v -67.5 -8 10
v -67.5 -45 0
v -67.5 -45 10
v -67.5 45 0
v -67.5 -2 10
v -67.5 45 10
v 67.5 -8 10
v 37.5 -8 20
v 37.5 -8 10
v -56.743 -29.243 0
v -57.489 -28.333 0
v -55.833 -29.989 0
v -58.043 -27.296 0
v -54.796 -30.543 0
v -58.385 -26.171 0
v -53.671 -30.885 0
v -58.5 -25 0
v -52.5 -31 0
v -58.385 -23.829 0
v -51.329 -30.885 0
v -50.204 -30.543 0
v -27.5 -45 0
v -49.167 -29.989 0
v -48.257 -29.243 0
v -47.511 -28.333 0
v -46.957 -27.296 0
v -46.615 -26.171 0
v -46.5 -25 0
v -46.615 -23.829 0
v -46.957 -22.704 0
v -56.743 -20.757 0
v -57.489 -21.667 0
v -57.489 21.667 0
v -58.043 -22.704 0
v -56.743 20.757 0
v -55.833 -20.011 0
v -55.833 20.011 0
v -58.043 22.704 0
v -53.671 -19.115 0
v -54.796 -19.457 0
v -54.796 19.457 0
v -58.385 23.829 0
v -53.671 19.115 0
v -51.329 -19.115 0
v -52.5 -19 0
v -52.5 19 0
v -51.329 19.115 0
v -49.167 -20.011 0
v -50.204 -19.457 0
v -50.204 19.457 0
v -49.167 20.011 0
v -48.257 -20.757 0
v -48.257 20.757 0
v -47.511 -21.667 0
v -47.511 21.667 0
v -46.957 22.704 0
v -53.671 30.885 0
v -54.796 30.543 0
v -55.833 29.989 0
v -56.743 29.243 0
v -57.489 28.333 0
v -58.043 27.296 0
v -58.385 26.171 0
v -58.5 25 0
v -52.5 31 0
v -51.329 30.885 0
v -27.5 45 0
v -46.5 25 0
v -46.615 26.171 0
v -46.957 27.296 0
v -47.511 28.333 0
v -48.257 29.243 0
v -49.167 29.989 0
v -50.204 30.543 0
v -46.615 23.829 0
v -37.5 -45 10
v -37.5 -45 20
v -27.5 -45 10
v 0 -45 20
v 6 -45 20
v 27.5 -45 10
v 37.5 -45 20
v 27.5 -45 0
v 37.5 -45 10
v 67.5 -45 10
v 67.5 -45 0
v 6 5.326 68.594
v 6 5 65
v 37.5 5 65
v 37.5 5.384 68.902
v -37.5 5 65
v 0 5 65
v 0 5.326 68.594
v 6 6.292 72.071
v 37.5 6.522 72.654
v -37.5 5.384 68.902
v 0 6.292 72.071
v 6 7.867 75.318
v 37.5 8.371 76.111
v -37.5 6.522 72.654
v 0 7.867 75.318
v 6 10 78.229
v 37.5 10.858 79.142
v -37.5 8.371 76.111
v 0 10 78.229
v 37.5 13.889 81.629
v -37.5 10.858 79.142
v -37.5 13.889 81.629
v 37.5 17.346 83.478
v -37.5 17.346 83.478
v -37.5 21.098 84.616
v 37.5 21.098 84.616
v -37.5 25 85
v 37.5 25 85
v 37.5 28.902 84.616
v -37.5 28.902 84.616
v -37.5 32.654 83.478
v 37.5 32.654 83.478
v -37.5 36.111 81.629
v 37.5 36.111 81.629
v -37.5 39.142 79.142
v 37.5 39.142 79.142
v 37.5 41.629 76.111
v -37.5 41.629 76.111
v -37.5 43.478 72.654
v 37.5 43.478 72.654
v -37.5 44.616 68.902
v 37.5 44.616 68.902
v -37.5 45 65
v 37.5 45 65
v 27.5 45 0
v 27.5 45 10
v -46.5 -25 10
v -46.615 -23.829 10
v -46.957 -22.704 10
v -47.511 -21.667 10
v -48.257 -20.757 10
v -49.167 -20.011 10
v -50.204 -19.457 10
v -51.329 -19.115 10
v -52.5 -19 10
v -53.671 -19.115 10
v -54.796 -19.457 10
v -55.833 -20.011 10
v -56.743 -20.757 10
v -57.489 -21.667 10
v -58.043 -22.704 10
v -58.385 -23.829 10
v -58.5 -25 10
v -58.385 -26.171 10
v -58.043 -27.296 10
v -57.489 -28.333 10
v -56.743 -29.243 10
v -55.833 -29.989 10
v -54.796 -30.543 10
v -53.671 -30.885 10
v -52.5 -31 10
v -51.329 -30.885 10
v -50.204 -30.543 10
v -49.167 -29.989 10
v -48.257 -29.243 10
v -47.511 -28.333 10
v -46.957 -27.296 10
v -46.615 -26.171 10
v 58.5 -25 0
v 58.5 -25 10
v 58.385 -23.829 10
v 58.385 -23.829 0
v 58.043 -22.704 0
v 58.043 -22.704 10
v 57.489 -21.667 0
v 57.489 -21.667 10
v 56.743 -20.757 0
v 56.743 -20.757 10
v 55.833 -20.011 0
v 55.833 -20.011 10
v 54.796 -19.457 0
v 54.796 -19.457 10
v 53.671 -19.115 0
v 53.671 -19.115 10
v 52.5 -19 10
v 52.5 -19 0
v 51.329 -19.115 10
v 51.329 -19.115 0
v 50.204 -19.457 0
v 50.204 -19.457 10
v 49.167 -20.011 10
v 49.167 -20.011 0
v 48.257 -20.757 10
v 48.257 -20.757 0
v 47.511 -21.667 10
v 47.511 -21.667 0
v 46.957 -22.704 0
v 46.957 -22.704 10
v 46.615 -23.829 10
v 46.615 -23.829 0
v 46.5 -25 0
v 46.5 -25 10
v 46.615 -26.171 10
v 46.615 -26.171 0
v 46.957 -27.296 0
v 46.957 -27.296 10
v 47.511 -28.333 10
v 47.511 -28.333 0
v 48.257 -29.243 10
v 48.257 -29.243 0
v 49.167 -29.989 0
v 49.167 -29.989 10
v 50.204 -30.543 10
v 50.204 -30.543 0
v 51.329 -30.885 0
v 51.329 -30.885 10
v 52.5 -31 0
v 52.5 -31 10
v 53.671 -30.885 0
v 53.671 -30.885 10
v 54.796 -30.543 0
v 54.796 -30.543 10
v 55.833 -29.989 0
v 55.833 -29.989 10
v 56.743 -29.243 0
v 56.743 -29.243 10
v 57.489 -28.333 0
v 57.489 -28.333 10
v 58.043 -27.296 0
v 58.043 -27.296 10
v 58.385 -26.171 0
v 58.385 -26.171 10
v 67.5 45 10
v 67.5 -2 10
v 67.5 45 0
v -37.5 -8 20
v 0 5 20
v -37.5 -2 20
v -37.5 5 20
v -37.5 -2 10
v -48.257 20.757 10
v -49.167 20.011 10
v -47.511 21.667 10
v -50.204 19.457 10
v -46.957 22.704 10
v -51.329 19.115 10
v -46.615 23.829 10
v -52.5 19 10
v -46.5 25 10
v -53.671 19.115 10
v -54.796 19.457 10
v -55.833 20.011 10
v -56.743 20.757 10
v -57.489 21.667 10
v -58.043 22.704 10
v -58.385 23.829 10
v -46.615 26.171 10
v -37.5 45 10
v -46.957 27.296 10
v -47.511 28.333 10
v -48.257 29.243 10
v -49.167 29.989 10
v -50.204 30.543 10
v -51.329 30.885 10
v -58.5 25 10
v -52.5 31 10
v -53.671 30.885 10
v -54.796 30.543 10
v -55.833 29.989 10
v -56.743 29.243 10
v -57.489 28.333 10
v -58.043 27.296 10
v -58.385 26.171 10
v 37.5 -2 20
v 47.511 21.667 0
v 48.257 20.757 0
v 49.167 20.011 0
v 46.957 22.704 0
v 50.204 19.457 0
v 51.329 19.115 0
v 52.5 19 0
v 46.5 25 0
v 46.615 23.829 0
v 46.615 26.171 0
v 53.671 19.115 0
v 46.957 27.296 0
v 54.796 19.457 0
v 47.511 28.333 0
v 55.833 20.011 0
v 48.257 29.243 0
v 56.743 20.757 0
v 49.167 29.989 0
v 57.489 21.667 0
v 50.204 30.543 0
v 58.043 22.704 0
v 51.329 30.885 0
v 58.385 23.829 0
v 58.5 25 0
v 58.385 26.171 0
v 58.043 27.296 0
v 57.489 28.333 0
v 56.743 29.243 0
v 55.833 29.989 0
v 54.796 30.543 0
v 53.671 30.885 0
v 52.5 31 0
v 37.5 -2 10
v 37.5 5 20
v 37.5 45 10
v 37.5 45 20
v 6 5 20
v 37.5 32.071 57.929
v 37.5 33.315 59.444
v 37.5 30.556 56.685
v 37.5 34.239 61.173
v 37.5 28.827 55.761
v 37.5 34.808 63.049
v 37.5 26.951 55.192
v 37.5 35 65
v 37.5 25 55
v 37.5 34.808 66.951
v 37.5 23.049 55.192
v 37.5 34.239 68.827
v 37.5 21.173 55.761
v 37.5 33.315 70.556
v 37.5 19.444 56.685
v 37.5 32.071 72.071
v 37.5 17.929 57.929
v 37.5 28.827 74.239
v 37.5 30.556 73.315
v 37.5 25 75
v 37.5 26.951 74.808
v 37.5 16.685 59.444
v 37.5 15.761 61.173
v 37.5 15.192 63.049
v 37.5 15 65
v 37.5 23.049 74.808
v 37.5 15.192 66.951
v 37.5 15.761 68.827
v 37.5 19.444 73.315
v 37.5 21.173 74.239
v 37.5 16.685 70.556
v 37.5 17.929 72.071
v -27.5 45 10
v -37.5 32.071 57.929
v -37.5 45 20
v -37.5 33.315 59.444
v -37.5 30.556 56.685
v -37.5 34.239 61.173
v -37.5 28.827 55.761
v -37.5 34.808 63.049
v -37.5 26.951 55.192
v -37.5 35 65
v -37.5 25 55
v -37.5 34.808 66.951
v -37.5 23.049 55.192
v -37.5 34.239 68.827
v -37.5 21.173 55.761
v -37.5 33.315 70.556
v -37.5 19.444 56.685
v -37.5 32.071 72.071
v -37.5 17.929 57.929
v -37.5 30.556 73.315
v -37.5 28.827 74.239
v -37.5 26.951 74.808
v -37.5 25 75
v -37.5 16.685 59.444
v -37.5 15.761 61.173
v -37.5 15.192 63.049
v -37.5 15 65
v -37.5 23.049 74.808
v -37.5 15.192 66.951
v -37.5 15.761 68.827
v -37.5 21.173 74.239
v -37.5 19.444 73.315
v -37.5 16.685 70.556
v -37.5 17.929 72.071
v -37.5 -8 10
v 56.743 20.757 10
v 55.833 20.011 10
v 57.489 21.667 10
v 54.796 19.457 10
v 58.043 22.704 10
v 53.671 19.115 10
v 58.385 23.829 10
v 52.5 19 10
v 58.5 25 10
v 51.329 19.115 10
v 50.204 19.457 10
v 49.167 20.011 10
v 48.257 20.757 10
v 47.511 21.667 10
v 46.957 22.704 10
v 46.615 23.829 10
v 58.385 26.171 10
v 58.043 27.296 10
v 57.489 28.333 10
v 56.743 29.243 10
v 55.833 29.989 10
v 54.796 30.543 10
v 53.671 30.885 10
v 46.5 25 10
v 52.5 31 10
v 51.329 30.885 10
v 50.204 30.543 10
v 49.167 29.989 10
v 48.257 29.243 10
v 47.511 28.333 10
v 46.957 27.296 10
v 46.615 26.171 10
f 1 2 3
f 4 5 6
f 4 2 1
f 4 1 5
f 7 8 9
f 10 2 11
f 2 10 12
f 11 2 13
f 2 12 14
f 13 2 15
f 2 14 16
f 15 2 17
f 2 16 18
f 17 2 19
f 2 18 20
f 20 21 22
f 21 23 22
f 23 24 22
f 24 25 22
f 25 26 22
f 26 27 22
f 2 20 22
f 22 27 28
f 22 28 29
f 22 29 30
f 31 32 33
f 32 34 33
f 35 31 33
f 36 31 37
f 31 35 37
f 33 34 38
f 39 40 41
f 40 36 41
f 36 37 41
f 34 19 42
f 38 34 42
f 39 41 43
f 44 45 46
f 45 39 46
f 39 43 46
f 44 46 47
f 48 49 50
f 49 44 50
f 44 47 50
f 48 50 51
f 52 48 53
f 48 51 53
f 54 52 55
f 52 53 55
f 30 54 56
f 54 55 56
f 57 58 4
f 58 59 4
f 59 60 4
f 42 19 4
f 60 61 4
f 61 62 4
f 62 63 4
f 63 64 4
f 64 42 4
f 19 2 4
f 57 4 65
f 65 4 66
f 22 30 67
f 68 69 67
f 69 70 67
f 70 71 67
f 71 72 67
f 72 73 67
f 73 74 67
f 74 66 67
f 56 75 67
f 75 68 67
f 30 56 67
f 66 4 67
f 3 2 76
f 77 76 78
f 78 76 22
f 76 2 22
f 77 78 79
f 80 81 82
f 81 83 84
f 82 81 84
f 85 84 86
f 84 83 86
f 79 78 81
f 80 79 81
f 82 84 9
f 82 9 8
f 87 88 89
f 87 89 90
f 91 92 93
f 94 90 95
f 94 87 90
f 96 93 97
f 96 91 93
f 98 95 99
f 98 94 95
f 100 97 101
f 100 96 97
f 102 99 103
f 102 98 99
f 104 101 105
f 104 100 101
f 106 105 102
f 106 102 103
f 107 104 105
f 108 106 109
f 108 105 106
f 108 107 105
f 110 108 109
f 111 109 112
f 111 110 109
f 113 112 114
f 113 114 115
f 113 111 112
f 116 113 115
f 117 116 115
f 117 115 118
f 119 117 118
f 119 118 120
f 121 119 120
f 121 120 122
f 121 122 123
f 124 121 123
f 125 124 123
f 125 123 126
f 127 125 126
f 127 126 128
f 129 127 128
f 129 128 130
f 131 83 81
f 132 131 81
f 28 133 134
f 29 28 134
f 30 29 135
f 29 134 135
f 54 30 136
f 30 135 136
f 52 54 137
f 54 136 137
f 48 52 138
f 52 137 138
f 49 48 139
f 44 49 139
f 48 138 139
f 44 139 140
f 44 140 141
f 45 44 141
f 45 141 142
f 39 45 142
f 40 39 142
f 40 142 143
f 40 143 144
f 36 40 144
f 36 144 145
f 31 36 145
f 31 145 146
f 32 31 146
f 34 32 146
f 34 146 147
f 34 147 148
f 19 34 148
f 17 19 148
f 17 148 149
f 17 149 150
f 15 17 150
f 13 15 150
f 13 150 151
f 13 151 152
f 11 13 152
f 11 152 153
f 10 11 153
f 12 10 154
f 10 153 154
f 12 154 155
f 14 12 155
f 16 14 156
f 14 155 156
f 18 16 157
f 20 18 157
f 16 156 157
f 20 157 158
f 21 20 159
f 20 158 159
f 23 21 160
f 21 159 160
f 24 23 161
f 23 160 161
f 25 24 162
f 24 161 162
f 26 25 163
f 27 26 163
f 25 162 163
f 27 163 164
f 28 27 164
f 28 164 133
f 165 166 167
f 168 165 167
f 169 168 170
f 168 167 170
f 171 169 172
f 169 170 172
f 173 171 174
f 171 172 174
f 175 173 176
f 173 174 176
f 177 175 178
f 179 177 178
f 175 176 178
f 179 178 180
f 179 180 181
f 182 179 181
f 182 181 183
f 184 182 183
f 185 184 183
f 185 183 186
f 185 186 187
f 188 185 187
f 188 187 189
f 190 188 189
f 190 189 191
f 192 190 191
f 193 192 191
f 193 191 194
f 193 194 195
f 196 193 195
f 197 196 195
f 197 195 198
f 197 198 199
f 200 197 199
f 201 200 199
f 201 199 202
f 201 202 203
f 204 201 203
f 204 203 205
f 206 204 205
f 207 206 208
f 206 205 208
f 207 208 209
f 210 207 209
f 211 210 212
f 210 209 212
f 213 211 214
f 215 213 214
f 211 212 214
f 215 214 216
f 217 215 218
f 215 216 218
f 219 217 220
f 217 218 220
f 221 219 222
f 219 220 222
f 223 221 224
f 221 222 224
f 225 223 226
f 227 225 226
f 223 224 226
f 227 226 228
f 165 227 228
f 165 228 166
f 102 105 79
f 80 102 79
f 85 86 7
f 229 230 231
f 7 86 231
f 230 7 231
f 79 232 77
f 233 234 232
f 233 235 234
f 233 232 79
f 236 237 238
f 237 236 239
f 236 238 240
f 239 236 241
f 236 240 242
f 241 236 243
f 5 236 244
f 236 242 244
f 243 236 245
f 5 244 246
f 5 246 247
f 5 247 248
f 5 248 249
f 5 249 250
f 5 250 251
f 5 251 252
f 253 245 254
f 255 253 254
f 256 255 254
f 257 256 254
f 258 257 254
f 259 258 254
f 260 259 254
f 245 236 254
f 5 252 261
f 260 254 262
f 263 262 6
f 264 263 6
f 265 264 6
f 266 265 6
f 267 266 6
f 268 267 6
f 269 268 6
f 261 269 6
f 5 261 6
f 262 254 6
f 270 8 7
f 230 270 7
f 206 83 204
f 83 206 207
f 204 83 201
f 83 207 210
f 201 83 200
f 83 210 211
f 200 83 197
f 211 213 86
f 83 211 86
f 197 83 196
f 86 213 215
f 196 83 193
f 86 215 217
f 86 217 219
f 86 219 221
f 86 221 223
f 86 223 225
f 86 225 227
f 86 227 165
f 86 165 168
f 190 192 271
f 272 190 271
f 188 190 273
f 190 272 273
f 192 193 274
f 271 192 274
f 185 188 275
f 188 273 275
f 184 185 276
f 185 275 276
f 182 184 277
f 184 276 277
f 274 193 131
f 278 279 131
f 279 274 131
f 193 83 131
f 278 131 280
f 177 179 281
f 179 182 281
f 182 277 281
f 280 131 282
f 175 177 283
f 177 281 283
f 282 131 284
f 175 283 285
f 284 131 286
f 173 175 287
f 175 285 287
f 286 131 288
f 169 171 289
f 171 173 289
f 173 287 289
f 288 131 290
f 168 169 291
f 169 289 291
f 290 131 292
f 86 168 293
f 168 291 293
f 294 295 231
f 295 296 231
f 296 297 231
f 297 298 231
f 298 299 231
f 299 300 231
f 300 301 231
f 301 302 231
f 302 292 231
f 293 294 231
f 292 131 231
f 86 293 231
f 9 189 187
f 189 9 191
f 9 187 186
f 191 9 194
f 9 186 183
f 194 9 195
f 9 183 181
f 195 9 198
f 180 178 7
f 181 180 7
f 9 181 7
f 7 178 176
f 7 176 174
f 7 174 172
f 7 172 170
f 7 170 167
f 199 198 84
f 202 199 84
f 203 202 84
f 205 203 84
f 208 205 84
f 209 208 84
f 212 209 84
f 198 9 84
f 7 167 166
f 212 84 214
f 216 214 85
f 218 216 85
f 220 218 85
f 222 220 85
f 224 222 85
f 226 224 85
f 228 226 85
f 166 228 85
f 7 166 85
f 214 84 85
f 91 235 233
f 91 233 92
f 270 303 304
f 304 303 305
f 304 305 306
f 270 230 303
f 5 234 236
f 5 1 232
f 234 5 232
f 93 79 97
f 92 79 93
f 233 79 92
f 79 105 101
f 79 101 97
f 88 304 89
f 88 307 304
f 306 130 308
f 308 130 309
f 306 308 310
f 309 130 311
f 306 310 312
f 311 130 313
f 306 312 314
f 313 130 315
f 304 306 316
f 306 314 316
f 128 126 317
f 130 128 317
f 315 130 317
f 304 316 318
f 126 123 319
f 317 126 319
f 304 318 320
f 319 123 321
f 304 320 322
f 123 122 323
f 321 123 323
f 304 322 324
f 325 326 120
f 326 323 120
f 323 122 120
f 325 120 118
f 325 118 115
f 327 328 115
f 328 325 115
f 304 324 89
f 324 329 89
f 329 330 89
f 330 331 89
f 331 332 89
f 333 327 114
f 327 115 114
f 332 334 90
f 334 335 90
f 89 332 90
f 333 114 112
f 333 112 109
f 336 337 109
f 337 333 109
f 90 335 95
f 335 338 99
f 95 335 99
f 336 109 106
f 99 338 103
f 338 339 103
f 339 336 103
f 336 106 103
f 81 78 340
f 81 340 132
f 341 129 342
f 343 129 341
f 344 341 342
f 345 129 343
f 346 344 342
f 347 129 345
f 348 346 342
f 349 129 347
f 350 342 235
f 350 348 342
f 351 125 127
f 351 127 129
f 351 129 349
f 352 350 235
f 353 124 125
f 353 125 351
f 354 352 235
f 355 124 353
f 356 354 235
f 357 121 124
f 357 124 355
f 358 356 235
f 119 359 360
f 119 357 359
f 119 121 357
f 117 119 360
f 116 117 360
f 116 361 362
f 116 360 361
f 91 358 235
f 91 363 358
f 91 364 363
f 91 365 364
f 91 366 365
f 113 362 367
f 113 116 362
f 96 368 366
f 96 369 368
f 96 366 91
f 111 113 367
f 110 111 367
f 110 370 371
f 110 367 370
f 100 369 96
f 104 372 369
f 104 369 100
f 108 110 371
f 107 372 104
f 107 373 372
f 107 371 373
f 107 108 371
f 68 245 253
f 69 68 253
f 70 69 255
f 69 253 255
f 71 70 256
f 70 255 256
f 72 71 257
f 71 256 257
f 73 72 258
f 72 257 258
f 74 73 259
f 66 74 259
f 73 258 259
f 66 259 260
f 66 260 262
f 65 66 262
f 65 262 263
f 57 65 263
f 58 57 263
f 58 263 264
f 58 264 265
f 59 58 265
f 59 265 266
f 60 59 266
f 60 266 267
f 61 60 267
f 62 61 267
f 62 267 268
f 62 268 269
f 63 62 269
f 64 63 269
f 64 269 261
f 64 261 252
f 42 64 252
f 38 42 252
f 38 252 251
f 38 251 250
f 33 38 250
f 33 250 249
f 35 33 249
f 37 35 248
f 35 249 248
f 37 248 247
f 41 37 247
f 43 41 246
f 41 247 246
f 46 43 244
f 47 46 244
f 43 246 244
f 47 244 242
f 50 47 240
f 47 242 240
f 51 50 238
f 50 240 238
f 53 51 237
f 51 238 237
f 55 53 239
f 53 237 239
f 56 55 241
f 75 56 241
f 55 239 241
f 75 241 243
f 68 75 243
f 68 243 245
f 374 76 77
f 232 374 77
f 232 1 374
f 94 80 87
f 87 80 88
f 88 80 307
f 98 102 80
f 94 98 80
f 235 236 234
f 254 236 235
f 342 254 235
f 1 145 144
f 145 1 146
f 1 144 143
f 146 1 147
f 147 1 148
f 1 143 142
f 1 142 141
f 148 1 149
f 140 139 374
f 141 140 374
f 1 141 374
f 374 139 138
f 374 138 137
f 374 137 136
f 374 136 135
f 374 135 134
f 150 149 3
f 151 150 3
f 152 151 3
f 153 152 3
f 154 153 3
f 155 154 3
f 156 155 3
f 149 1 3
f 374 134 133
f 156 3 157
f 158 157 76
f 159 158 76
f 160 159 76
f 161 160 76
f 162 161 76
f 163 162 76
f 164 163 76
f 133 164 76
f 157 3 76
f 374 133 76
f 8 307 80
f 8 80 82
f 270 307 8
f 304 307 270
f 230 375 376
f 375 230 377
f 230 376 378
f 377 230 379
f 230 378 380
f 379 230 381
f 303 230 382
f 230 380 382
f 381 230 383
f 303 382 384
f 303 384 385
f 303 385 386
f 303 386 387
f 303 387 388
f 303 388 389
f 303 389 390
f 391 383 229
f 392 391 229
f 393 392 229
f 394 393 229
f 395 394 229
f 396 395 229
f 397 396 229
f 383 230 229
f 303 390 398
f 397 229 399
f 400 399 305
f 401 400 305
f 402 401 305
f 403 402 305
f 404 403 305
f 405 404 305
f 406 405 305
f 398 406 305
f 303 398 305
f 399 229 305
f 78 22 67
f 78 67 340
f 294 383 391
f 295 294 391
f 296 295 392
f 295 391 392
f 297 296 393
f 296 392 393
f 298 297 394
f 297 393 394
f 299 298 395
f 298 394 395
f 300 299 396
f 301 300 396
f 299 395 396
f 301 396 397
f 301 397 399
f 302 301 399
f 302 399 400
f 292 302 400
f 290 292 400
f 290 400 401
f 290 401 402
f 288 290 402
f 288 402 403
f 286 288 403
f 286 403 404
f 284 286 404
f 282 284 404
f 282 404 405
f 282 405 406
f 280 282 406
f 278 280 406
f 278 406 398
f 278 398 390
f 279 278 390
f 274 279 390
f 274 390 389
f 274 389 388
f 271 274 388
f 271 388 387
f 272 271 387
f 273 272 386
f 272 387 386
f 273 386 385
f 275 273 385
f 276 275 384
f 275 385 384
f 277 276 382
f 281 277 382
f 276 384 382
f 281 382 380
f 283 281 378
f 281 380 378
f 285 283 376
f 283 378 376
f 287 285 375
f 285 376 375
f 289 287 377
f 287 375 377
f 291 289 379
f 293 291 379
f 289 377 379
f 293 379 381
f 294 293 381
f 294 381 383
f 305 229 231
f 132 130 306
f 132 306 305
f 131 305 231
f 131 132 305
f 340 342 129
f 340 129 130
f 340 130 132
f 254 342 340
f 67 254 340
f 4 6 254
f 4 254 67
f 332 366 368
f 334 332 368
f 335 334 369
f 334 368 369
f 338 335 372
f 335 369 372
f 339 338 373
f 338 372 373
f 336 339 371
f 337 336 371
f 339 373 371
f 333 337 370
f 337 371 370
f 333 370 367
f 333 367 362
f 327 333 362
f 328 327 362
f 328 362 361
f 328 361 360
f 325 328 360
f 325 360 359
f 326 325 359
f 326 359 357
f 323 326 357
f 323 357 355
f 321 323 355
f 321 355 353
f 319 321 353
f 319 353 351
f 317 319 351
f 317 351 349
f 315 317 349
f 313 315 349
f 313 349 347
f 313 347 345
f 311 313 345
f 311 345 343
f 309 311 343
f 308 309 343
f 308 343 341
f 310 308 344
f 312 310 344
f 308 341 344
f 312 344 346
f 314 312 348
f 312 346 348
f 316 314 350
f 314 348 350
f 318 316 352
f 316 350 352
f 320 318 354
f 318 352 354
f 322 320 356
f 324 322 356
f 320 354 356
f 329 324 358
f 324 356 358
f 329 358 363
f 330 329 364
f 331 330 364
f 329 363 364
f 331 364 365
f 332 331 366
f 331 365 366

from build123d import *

# Parameters (mm, degrees)
F0_W      = 135
F0_H      = 90
F1_DEPTH  = 20
F2_W      = 55
F2_H      = 14.937833
F3_DEPTH  = 90
F4_W      = 35.29747
F4_H      = 17.323516
F5_DEPTH  = 37
F6_W      = 33.973107
F6_H      = 14.05538
F7_DEPTH  = 47
F9_DEPTH  = 6
F11_DEPTH = 75
F12_R     = 10
F13_DEPTH = 105.001
F14_R     = 6
F15_DEPTH = 10.001
F16_W     = 6
F16_H     = 55
F17_DEPTH = 65
F19_DEPTH = 6


with BuildPart() as f1:
    # F0 (on Top) → F1 (new body)
    with BuildSketch(Plane.XY):
        Rectangle(F0_W, F0_H)
    extrude(amount=F1_DEPTH)

    # F2 (on face) → F3 (cut, through all)
    with BuildSketch(Plane.XZ.offset(45)):
        with Locations((0, 2.531084)):
            Rectangle(F2_W, F2_H)
    extrude(amount=-F3_DEPTH, mode=Mode.SUBTRACT)

    # F4 (on face) → F5 (cut)
    with BuildSketch(Plane.XZ.offset(45)):
        with Locations((-55.148735, 18.661758)):
            Rectangle(F4_W, F4_H)
        with Locations((55.148735, 18.661758)):
            Rectangle(F4_W, F4_H)
    extrude(amount=-F5_DEPTH, mode=Mode.SUBTRACT)

    # F6 (on face) → F7 (cut)
    with BuildSketch(Plane(origin=(0, 45, 0), x_dir=(-1, 0, 0), z_dir=(0, 1, 0))):
        with Locations((-54.486553, 17.02769)):
            Rectangle(F6_W, F6_H)
        with Locations((54.486553, 17.02769)):
            Rectangle(F6_W, F6_H)
    extrude(amount=-F7_DEPTH, mode=Mode.SUBTRACT)

    # F8 (on face) → F9 (cut, through all)
    with BuildSketch(Plane.XZ.offset(8)):
        Polygon((-69.806829, 10), (-67.5, 10), (-37.5, 20), (-37.5, 24.232961), (-69.806829, 24.232961), align=None)
        Polygon((69.806829, 24.232961), (37.5, 24.232961), (37.5, 20), (67.5, 10), (69.806829, 10), align=None)
    extrude(amount=-F9_DEPTH, mode=Mode.SUBTRACT)

    # F10 (on face) → F11 (join, through all)
    with BuildSketch(Plane(origin=(-37.5, 0, 0), x_dir=(0, -1, 0), z_dir=(-1, 0, 0))):
        with BuildLine():
            Line((-45, 65), (-45, 20))
            Line((-45, 20), (-5, 20))
            Line((-5, 20), (-5, 65))
            ThreePointArc((-5, 65), (-25, 85), (-45, 65))
        make_face()
    extrude(amount=-F11_DEPTH)

    # F12 (on face) → F13 (cut, through all)
    with BuildSketch(Plane(origin=(-37.5, 0, 0), x_dir=(0, -1, 0), z_dir=(-1, 0, 0))):
        with Locations((-25, 65)):
            Circle(F12_R)
    extrude(amount=-F13_DEPTH, mode=Mode.SUBTRACT)

    # F14 (on face) → F15 (cut, through all)
    with BuildSketch(Plane.XY.offset(10)):
        with Locations((-52.5, -25)):
            Circle(F14_R)
        with Locations((-52.5, 25)):
            Circle(F14_R)
        with Locations((52.5, -25)):
            Circle(F14_R)
        with Locations((52.5, 25)):
            Circle(F14_R)
    extrude(amount=-F15_DEPTH, mode=Mode.SUBTRACT)

    # F16 (on face) → F17 (join)
    with BuildSketch(Plane.XY.offset(20)):
        with Locations((3, -17.5)):
            Rectangle(F16_W, F16_H)
    extrude(amount=F17_DEPTH)

    # F18 (on face) → F19 (cut)
    with BuildSketch(Plane(origin=(0, 0, 0), x_dir=(0, -1, 0), z_dir=(-1, 0, 0))):
        Polygon((-10, 78.228757), (45, 20), (45, 85), (-10, 85), align=None)
    extrude(amount=-F19_DEPTH, mode=Mode.SUBTRACT)


solid = f1.part
